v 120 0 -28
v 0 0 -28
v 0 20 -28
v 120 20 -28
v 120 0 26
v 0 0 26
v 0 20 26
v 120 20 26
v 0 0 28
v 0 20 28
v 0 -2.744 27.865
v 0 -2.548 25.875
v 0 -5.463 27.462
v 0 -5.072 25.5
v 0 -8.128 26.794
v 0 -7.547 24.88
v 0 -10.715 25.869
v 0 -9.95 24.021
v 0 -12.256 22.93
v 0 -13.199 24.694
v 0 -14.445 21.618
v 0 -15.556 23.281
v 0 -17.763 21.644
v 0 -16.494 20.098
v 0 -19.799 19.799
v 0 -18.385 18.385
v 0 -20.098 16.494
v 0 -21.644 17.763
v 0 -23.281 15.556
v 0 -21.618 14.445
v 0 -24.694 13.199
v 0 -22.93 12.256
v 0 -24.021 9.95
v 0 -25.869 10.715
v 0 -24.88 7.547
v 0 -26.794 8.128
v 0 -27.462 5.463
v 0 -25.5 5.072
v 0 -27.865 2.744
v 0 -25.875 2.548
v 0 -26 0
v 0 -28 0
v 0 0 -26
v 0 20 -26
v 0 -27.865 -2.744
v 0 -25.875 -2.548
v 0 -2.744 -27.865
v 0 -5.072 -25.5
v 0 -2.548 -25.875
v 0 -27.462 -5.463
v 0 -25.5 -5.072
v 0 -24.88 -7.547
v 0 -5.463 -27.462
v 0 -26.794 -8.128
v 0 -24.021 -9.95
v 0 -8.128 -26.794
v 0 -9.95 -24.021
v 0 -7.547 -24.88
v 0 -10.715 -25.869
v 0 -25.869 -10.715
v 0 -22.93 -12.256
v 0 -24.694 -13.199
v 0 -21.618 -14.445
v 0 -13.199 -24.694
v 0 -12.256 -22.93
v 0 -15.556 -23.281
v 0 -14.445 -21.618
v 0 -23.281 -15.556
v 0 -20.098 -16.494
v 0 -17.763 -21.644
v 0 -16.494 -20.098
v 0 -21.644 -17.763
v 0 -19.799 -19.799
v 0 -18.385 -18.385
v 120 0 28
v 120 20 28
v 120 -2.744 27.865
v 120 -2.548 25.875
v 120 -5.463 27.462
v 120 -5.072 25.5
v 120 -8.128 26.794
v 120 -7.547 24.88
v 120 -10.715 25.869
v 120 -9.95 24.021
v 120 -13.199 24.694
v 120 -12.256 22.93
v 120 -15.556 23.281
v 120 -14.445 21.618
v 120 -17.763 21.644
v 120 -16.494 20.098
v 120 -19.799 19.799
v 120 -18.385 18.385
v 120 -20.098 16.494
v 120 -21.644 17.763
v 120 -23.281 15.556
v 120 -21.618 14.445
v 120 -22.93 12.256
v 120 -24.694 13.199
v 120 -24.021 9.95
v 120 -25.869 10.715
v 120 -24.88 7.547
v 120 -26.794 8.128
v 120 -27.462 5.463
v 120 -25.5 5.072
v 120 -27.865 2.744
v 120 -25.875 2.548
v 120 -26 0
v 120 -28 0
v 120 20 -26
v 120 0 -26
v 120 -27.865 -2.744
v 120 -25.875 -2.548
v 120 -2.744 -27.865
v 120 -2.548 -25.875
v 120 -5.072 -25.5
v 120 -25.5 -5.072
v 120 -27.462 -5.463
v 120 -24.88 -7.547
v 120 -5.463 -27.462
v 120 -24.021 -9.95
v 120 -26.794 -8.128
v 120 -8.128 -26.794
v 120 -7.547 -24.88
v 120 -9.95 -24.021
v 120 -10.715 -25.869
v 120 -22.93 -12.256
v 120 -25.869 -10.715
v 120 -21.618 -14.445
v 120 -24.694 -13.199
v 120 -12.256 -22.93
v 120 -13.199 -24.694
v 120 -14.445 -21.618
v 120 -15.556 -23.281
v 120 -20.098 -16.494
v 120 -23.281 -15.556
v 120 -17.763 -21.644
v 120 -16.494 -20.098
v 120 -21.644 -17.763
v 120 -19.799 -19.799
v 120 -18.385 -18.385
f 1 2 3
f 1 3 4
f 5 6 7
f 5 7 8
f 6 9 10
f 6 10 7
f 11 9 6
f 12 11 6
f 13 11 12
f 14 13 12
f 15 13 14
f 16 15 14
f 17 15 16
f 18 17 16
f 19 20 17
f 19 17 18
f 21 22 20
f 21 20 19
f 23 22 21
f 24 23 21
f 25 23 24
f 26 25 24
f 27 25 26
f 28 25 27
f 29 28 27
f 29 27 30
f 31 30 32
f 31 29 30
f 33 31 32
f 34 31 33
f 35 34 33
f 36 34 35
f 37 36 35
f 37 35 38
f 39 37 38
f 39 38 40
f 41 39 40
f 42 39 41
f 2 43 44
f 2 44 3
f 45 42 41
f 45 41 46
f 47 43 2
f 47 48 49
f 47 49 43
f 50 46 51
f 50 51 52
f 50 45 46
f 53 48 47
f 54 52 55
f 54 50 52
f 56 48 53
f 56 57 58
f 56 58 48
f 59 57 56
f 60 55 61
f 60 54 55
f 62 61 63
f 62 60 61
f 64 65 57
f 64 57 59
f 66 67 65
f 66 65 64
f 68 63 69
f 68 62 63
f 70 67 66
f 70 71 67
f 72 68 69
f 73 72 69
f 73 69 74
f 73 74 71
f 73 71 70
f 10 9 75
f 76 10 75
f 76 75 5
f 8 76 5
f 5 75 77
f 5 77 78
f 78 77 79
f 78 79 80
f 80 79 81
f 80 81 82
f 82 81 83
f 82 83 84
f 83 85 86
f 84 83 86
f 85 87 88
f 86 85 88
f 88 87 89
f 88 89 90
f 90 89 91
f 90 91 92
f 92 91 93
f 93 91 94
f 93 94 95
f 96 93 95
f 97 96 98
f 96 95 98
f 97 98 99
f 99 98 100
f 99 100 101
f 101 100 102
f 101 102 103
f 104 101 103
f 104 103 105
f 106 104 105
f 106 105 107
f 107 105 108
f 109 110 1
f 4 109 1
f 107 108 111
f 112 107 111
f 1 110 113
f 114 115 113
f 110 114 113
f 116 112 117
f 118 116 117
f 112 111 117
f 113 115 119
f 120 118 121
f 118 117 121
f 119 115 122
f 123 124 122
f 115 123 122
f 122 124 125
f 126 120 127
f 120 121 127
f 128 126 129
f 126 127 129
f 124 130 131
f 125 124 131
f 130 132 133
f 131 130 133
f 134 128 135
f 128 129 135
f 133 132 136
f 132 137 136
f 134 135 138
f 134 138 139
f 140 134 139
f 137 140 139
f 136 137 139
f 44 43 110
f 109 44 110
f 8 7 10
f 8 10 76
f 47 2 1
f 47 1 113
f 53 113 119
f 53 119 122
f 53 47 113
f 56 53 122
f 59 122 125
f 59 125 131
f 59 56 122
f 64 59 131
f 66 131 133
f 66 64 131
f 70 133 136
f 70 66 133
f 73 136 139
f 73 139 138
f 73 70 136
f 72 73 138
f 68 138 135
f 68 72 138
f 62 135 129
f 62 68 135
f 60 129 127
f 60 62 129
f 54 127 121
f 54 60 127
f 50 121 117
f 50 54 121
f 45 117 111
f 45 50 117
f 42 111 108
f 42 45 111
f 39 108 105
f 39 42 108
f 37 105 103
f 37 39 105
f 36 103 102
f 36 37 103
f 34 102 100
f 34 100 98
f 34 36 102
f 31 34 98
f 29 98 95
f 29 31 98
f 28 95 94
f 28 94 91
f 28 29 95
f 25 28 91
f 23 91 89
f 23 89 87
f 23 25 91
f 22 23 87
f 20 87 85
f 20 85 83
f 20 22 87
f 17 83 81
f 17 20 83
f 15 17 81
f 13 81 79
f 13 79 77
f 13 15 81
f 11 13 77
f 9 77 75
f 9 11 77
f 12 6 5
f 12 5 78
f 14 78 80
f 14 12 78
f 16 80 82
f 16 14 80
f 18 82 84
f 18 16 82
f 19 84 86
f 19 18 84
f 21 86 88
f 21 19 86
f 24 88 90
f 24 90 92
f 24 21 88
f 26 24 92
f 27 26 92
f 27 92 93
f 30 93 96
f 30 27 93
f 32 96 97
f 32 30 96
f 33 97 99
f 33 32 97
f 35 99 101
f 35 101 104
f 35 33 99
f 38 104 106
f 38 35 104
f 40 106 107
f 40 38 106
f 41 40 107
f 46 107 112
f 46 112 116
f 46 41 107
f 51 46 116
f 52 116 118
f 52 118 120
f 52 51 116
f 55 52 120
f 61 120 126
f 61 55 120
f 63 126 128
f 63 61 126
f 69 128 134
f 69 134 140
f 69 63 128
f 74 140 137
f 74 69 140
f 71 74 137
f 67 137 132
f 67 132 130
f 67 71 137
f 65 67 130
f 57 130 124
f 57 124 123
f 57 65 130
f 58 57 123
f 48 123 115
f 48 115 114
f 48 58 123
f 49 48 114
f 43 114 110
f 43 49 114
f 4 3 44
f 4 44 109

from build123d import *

# Parameters (mm, degrees)
BOSS_EXTRUDE1_DEPTH = 120
SKETCH2_W           = 120
SKETCH2_H           = 2
BOSS_EXTRUDE2_DEPTH = 20


with BuildPart() as part:
    # Sketch1 → Boss-Extrude1 (new body)
    with BuildSketch(Plane(origin=(0, 0, 0), x_dir=(0, 0, -1), z_dir=(1, 0, 0))):
        with BuildLine():
            Line((26, 0), (28, 0))
            ThreePointArc((28, 0), (0, -28), (-28, 0))
            Line((-28, 0), (-26, 0))
            ThreePointArc((-26, 0), (0, -26), (26, 0))
        make_face()
    extrude(amount=BOSS_EXTRUDE1_DEPTH)

    # Sketch2 → Boss-Extrude2 (add)
    with BuildSketch(Plane(origin=(0, 0, 0), x_dir=(1, 0, 0), z_dir=(0, 1, 0))):
        with Locations((60, 27)):
            Rectangle(SKETCH2_W, SKETCH2_H)
        with Locations((60, -27)):
            Rectangle(SKETCH2_W, SKETCH2_H)
    extrude(amount=BOSS_EXTRUDE2_DEPTH)


solid = part.part
